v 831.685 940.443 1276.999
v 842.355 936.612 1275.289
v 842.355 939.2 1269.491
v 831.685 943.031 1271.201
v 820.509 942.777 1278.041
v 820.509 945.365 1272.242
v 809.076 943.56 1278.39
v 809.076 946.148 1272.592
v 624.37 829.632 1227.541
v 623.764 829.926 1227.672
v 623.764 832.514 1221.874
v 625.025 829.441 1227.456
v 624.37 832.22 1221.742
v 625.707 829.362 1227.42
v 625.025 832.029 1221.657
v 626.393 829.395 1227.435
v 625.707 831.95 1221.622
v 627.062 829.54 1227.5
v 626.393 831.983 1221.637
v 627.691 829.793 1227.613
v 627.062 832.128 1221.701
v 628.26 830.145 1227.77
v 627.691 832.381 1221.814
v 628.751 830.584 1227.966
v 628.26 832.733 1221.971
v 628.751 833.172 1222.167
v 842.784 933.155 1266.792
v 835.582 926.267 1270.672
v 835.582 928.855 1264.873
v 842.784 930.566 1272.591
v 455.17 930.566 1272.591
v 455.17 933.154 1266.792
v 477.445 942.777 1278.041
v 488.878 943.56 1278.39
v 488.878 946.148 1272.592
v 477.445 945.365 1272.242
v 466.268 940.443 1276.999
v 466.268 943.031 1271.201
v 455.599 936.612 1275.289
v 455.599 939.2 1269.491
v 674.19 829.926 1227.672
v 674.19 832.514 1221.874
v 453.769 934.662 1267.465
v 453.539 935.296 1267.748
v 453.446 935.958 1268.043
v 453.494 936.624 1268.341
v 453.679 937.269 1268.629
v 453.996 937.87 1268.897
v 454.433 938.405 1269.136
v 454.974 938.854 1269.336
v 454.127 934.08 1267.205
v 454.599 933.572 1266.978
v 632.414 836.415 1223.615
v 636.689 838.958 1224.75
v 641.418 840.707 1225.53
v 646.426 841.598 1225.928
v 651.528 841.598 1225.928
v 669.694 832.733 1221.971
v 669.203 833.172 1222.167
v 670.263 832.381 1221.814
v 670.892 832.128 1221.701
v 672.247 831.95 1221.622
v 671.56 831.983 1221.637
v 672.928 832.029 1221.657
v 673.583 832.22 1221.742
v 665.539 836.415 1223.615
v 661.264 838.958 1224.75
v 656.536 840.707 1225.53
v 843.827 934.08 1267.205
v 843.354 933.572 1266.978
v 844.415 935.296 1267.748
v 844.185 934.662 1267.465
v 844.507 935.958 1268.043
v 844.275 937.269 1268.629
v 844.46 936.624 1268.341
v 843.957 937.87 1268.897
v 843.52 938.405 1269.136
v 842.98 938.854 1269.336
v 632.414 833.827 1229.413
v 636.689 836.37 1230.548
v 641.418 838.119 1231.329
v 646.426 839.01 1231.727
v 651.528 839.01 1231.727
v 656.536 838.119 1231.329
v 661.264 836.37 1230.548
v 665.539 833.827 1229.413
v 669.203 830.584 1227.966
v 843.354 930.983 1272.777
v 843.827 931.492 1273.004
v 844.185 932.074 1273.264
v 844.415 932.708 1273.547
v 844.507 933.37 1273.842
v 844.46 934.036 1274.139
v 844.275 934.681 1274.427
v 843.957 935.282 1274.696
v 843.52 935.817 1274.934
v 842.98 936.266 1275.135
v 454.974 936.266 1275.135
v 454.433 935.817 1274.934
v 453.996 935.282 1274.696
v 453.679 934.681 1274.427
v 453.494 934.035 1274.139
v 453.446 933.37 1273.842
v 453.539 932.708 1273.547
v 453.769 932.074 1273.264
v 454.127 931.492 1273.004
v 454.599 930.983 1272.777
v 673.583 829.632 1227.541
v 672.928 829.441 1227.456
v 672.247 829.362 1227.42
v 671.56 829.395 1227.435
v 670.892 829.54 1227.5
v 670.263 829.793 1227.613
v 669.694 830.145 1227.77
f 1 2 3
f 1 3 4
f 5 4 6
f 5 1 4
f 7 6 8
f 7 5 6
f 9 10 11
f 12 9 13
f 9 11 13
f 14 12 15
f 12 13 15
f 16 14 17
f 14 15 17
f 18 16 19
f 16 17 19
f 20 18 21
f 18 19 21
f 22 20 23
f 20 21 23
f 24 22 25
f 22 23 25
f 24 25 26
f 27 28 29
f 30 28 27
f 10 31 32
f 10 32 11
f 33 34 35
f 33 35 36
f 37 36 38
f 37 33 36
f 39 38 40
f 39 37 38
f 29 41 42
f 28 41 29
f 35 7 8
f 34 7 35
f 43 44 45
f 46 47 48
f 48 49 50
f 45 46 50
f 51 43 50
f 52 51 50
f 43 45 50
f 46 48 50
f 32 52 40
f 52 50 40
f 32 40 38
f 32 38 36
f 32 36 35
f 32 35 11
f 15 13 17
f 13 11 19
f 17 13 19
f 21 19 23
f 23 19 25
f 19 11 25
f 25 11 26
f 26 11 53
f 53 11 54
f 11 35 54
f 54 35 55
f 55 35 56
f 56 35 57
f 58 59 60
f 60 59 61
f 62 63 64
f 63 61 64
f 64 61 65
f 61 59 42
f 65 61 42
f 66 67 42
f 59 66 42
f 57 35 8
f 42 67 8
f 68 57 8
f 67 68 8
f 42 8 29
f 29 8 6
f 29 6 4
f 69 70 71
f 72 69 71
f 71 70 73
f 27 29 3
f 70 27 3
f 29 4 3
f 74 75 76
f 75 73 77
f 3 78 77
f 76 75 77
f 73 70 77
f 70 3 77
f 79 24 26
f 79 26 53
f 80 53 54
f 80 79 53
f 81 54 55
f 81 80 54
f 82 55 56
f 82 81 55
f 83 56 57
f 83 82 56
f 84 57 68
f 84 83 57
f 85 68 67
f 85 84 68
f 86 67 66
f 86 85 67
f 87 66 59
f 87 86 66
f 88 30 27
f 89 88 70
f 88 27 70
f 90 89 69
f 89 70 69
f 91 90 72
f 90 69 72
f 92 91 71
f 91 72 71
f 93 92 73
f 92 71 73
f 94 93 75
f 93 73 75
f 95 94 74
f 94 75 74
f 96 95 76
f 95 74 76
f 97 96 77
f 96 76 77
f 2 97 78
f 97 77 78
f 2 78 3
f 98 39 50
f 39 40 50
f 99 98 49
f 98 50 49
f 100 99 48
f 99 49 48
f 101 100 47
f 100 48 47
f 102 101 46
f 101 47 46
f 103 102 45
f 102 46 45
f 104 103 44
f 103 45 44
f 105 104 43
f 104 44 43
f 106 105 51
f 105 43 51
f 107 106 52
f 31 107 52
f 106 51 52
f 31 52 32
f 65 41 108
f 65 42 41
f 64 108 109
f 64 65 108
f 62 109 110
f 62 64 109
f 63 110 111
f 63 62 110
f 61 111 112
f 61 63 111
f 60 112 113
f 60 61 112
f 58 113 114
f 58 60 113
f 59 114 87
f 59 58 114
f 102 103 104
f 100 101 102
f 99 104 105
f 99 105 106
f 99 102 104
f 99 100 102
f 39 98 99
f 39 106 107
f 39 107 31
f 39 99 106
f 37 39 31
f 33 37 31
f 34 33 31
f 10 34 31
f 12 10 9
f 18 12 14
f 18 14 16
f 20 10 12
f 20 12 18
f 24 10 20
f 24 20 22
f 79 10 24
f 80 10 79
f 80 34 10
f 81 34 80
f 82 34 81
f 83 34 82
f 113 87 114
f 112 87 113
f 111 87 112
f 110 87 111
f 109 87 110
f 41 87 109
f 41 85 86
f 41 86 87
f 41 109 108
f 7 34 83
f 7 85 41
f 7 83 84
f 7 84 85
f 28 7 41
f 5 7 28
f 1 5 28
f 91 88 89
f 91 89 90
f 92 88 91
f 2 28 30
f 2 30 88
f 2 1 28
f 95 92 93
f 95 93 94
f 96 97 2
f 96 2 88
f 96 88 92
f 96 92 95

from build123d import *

# Parameters (mm, degrees)
BOSS_EXTRUDE1_DEPTH = 6.35
FILLET1_R           = 3.81


with BuildPart() as part:
    # Sketch3 → Boss-Extrude1 (new body)
    with BuildSketch(Plane(origin=(809.076030053, 943.560396052, 1278.390464274), x_dir=(-1, 0, 0), z_dir=(0, 0.4075747752498649, -0.913171836282757))):
        with BuildLine():
            Line((137.874265639, -126.392405854), (-26.505638525, -18.937567822))
            Line((-26.505638525, -18.937567822), (-39.07644953, -10.720052017))
            ThreePointArc((-39.07644953, -10.720052017), (-20.260111199, -2.728624711), (0, 0))
            Line((0, 0), (320.198396744, 0))
            ThreePointArc((320.198396744, 0), (340.458416927, -2.728663039), (359.274618149, -10.720195518))
            Line((359.274618149, -10.720195518), (346.703910708, -18.937649247))
            Line((346.703910708, -18.937649247), (182.324265639, -126.392391447))
            ThreePointArc((182.324265639, -126.392391447), (160.099261742, -114.368537545), (137.874265639, -126.392405854))
        make_face()
    extrude(amount=BOSS_EXTRUDE1_DEPTH)

    # Fillet1
    fillet1_edges = [part.edges().sort_by_distance(p)[0] for p in [
        (671.201764414, 829.436460617, 1223.976787284),
        (848.152479583, 935.065196378, 1271.121920902),
        (449.801411904, 935.065065337, 1271.121862415),
        (626.751764414, 829.436473773, 1223.976793156),
    ]]
    fillet(fillet1_edges, radius=FILLET1_R)


solid = part.part
